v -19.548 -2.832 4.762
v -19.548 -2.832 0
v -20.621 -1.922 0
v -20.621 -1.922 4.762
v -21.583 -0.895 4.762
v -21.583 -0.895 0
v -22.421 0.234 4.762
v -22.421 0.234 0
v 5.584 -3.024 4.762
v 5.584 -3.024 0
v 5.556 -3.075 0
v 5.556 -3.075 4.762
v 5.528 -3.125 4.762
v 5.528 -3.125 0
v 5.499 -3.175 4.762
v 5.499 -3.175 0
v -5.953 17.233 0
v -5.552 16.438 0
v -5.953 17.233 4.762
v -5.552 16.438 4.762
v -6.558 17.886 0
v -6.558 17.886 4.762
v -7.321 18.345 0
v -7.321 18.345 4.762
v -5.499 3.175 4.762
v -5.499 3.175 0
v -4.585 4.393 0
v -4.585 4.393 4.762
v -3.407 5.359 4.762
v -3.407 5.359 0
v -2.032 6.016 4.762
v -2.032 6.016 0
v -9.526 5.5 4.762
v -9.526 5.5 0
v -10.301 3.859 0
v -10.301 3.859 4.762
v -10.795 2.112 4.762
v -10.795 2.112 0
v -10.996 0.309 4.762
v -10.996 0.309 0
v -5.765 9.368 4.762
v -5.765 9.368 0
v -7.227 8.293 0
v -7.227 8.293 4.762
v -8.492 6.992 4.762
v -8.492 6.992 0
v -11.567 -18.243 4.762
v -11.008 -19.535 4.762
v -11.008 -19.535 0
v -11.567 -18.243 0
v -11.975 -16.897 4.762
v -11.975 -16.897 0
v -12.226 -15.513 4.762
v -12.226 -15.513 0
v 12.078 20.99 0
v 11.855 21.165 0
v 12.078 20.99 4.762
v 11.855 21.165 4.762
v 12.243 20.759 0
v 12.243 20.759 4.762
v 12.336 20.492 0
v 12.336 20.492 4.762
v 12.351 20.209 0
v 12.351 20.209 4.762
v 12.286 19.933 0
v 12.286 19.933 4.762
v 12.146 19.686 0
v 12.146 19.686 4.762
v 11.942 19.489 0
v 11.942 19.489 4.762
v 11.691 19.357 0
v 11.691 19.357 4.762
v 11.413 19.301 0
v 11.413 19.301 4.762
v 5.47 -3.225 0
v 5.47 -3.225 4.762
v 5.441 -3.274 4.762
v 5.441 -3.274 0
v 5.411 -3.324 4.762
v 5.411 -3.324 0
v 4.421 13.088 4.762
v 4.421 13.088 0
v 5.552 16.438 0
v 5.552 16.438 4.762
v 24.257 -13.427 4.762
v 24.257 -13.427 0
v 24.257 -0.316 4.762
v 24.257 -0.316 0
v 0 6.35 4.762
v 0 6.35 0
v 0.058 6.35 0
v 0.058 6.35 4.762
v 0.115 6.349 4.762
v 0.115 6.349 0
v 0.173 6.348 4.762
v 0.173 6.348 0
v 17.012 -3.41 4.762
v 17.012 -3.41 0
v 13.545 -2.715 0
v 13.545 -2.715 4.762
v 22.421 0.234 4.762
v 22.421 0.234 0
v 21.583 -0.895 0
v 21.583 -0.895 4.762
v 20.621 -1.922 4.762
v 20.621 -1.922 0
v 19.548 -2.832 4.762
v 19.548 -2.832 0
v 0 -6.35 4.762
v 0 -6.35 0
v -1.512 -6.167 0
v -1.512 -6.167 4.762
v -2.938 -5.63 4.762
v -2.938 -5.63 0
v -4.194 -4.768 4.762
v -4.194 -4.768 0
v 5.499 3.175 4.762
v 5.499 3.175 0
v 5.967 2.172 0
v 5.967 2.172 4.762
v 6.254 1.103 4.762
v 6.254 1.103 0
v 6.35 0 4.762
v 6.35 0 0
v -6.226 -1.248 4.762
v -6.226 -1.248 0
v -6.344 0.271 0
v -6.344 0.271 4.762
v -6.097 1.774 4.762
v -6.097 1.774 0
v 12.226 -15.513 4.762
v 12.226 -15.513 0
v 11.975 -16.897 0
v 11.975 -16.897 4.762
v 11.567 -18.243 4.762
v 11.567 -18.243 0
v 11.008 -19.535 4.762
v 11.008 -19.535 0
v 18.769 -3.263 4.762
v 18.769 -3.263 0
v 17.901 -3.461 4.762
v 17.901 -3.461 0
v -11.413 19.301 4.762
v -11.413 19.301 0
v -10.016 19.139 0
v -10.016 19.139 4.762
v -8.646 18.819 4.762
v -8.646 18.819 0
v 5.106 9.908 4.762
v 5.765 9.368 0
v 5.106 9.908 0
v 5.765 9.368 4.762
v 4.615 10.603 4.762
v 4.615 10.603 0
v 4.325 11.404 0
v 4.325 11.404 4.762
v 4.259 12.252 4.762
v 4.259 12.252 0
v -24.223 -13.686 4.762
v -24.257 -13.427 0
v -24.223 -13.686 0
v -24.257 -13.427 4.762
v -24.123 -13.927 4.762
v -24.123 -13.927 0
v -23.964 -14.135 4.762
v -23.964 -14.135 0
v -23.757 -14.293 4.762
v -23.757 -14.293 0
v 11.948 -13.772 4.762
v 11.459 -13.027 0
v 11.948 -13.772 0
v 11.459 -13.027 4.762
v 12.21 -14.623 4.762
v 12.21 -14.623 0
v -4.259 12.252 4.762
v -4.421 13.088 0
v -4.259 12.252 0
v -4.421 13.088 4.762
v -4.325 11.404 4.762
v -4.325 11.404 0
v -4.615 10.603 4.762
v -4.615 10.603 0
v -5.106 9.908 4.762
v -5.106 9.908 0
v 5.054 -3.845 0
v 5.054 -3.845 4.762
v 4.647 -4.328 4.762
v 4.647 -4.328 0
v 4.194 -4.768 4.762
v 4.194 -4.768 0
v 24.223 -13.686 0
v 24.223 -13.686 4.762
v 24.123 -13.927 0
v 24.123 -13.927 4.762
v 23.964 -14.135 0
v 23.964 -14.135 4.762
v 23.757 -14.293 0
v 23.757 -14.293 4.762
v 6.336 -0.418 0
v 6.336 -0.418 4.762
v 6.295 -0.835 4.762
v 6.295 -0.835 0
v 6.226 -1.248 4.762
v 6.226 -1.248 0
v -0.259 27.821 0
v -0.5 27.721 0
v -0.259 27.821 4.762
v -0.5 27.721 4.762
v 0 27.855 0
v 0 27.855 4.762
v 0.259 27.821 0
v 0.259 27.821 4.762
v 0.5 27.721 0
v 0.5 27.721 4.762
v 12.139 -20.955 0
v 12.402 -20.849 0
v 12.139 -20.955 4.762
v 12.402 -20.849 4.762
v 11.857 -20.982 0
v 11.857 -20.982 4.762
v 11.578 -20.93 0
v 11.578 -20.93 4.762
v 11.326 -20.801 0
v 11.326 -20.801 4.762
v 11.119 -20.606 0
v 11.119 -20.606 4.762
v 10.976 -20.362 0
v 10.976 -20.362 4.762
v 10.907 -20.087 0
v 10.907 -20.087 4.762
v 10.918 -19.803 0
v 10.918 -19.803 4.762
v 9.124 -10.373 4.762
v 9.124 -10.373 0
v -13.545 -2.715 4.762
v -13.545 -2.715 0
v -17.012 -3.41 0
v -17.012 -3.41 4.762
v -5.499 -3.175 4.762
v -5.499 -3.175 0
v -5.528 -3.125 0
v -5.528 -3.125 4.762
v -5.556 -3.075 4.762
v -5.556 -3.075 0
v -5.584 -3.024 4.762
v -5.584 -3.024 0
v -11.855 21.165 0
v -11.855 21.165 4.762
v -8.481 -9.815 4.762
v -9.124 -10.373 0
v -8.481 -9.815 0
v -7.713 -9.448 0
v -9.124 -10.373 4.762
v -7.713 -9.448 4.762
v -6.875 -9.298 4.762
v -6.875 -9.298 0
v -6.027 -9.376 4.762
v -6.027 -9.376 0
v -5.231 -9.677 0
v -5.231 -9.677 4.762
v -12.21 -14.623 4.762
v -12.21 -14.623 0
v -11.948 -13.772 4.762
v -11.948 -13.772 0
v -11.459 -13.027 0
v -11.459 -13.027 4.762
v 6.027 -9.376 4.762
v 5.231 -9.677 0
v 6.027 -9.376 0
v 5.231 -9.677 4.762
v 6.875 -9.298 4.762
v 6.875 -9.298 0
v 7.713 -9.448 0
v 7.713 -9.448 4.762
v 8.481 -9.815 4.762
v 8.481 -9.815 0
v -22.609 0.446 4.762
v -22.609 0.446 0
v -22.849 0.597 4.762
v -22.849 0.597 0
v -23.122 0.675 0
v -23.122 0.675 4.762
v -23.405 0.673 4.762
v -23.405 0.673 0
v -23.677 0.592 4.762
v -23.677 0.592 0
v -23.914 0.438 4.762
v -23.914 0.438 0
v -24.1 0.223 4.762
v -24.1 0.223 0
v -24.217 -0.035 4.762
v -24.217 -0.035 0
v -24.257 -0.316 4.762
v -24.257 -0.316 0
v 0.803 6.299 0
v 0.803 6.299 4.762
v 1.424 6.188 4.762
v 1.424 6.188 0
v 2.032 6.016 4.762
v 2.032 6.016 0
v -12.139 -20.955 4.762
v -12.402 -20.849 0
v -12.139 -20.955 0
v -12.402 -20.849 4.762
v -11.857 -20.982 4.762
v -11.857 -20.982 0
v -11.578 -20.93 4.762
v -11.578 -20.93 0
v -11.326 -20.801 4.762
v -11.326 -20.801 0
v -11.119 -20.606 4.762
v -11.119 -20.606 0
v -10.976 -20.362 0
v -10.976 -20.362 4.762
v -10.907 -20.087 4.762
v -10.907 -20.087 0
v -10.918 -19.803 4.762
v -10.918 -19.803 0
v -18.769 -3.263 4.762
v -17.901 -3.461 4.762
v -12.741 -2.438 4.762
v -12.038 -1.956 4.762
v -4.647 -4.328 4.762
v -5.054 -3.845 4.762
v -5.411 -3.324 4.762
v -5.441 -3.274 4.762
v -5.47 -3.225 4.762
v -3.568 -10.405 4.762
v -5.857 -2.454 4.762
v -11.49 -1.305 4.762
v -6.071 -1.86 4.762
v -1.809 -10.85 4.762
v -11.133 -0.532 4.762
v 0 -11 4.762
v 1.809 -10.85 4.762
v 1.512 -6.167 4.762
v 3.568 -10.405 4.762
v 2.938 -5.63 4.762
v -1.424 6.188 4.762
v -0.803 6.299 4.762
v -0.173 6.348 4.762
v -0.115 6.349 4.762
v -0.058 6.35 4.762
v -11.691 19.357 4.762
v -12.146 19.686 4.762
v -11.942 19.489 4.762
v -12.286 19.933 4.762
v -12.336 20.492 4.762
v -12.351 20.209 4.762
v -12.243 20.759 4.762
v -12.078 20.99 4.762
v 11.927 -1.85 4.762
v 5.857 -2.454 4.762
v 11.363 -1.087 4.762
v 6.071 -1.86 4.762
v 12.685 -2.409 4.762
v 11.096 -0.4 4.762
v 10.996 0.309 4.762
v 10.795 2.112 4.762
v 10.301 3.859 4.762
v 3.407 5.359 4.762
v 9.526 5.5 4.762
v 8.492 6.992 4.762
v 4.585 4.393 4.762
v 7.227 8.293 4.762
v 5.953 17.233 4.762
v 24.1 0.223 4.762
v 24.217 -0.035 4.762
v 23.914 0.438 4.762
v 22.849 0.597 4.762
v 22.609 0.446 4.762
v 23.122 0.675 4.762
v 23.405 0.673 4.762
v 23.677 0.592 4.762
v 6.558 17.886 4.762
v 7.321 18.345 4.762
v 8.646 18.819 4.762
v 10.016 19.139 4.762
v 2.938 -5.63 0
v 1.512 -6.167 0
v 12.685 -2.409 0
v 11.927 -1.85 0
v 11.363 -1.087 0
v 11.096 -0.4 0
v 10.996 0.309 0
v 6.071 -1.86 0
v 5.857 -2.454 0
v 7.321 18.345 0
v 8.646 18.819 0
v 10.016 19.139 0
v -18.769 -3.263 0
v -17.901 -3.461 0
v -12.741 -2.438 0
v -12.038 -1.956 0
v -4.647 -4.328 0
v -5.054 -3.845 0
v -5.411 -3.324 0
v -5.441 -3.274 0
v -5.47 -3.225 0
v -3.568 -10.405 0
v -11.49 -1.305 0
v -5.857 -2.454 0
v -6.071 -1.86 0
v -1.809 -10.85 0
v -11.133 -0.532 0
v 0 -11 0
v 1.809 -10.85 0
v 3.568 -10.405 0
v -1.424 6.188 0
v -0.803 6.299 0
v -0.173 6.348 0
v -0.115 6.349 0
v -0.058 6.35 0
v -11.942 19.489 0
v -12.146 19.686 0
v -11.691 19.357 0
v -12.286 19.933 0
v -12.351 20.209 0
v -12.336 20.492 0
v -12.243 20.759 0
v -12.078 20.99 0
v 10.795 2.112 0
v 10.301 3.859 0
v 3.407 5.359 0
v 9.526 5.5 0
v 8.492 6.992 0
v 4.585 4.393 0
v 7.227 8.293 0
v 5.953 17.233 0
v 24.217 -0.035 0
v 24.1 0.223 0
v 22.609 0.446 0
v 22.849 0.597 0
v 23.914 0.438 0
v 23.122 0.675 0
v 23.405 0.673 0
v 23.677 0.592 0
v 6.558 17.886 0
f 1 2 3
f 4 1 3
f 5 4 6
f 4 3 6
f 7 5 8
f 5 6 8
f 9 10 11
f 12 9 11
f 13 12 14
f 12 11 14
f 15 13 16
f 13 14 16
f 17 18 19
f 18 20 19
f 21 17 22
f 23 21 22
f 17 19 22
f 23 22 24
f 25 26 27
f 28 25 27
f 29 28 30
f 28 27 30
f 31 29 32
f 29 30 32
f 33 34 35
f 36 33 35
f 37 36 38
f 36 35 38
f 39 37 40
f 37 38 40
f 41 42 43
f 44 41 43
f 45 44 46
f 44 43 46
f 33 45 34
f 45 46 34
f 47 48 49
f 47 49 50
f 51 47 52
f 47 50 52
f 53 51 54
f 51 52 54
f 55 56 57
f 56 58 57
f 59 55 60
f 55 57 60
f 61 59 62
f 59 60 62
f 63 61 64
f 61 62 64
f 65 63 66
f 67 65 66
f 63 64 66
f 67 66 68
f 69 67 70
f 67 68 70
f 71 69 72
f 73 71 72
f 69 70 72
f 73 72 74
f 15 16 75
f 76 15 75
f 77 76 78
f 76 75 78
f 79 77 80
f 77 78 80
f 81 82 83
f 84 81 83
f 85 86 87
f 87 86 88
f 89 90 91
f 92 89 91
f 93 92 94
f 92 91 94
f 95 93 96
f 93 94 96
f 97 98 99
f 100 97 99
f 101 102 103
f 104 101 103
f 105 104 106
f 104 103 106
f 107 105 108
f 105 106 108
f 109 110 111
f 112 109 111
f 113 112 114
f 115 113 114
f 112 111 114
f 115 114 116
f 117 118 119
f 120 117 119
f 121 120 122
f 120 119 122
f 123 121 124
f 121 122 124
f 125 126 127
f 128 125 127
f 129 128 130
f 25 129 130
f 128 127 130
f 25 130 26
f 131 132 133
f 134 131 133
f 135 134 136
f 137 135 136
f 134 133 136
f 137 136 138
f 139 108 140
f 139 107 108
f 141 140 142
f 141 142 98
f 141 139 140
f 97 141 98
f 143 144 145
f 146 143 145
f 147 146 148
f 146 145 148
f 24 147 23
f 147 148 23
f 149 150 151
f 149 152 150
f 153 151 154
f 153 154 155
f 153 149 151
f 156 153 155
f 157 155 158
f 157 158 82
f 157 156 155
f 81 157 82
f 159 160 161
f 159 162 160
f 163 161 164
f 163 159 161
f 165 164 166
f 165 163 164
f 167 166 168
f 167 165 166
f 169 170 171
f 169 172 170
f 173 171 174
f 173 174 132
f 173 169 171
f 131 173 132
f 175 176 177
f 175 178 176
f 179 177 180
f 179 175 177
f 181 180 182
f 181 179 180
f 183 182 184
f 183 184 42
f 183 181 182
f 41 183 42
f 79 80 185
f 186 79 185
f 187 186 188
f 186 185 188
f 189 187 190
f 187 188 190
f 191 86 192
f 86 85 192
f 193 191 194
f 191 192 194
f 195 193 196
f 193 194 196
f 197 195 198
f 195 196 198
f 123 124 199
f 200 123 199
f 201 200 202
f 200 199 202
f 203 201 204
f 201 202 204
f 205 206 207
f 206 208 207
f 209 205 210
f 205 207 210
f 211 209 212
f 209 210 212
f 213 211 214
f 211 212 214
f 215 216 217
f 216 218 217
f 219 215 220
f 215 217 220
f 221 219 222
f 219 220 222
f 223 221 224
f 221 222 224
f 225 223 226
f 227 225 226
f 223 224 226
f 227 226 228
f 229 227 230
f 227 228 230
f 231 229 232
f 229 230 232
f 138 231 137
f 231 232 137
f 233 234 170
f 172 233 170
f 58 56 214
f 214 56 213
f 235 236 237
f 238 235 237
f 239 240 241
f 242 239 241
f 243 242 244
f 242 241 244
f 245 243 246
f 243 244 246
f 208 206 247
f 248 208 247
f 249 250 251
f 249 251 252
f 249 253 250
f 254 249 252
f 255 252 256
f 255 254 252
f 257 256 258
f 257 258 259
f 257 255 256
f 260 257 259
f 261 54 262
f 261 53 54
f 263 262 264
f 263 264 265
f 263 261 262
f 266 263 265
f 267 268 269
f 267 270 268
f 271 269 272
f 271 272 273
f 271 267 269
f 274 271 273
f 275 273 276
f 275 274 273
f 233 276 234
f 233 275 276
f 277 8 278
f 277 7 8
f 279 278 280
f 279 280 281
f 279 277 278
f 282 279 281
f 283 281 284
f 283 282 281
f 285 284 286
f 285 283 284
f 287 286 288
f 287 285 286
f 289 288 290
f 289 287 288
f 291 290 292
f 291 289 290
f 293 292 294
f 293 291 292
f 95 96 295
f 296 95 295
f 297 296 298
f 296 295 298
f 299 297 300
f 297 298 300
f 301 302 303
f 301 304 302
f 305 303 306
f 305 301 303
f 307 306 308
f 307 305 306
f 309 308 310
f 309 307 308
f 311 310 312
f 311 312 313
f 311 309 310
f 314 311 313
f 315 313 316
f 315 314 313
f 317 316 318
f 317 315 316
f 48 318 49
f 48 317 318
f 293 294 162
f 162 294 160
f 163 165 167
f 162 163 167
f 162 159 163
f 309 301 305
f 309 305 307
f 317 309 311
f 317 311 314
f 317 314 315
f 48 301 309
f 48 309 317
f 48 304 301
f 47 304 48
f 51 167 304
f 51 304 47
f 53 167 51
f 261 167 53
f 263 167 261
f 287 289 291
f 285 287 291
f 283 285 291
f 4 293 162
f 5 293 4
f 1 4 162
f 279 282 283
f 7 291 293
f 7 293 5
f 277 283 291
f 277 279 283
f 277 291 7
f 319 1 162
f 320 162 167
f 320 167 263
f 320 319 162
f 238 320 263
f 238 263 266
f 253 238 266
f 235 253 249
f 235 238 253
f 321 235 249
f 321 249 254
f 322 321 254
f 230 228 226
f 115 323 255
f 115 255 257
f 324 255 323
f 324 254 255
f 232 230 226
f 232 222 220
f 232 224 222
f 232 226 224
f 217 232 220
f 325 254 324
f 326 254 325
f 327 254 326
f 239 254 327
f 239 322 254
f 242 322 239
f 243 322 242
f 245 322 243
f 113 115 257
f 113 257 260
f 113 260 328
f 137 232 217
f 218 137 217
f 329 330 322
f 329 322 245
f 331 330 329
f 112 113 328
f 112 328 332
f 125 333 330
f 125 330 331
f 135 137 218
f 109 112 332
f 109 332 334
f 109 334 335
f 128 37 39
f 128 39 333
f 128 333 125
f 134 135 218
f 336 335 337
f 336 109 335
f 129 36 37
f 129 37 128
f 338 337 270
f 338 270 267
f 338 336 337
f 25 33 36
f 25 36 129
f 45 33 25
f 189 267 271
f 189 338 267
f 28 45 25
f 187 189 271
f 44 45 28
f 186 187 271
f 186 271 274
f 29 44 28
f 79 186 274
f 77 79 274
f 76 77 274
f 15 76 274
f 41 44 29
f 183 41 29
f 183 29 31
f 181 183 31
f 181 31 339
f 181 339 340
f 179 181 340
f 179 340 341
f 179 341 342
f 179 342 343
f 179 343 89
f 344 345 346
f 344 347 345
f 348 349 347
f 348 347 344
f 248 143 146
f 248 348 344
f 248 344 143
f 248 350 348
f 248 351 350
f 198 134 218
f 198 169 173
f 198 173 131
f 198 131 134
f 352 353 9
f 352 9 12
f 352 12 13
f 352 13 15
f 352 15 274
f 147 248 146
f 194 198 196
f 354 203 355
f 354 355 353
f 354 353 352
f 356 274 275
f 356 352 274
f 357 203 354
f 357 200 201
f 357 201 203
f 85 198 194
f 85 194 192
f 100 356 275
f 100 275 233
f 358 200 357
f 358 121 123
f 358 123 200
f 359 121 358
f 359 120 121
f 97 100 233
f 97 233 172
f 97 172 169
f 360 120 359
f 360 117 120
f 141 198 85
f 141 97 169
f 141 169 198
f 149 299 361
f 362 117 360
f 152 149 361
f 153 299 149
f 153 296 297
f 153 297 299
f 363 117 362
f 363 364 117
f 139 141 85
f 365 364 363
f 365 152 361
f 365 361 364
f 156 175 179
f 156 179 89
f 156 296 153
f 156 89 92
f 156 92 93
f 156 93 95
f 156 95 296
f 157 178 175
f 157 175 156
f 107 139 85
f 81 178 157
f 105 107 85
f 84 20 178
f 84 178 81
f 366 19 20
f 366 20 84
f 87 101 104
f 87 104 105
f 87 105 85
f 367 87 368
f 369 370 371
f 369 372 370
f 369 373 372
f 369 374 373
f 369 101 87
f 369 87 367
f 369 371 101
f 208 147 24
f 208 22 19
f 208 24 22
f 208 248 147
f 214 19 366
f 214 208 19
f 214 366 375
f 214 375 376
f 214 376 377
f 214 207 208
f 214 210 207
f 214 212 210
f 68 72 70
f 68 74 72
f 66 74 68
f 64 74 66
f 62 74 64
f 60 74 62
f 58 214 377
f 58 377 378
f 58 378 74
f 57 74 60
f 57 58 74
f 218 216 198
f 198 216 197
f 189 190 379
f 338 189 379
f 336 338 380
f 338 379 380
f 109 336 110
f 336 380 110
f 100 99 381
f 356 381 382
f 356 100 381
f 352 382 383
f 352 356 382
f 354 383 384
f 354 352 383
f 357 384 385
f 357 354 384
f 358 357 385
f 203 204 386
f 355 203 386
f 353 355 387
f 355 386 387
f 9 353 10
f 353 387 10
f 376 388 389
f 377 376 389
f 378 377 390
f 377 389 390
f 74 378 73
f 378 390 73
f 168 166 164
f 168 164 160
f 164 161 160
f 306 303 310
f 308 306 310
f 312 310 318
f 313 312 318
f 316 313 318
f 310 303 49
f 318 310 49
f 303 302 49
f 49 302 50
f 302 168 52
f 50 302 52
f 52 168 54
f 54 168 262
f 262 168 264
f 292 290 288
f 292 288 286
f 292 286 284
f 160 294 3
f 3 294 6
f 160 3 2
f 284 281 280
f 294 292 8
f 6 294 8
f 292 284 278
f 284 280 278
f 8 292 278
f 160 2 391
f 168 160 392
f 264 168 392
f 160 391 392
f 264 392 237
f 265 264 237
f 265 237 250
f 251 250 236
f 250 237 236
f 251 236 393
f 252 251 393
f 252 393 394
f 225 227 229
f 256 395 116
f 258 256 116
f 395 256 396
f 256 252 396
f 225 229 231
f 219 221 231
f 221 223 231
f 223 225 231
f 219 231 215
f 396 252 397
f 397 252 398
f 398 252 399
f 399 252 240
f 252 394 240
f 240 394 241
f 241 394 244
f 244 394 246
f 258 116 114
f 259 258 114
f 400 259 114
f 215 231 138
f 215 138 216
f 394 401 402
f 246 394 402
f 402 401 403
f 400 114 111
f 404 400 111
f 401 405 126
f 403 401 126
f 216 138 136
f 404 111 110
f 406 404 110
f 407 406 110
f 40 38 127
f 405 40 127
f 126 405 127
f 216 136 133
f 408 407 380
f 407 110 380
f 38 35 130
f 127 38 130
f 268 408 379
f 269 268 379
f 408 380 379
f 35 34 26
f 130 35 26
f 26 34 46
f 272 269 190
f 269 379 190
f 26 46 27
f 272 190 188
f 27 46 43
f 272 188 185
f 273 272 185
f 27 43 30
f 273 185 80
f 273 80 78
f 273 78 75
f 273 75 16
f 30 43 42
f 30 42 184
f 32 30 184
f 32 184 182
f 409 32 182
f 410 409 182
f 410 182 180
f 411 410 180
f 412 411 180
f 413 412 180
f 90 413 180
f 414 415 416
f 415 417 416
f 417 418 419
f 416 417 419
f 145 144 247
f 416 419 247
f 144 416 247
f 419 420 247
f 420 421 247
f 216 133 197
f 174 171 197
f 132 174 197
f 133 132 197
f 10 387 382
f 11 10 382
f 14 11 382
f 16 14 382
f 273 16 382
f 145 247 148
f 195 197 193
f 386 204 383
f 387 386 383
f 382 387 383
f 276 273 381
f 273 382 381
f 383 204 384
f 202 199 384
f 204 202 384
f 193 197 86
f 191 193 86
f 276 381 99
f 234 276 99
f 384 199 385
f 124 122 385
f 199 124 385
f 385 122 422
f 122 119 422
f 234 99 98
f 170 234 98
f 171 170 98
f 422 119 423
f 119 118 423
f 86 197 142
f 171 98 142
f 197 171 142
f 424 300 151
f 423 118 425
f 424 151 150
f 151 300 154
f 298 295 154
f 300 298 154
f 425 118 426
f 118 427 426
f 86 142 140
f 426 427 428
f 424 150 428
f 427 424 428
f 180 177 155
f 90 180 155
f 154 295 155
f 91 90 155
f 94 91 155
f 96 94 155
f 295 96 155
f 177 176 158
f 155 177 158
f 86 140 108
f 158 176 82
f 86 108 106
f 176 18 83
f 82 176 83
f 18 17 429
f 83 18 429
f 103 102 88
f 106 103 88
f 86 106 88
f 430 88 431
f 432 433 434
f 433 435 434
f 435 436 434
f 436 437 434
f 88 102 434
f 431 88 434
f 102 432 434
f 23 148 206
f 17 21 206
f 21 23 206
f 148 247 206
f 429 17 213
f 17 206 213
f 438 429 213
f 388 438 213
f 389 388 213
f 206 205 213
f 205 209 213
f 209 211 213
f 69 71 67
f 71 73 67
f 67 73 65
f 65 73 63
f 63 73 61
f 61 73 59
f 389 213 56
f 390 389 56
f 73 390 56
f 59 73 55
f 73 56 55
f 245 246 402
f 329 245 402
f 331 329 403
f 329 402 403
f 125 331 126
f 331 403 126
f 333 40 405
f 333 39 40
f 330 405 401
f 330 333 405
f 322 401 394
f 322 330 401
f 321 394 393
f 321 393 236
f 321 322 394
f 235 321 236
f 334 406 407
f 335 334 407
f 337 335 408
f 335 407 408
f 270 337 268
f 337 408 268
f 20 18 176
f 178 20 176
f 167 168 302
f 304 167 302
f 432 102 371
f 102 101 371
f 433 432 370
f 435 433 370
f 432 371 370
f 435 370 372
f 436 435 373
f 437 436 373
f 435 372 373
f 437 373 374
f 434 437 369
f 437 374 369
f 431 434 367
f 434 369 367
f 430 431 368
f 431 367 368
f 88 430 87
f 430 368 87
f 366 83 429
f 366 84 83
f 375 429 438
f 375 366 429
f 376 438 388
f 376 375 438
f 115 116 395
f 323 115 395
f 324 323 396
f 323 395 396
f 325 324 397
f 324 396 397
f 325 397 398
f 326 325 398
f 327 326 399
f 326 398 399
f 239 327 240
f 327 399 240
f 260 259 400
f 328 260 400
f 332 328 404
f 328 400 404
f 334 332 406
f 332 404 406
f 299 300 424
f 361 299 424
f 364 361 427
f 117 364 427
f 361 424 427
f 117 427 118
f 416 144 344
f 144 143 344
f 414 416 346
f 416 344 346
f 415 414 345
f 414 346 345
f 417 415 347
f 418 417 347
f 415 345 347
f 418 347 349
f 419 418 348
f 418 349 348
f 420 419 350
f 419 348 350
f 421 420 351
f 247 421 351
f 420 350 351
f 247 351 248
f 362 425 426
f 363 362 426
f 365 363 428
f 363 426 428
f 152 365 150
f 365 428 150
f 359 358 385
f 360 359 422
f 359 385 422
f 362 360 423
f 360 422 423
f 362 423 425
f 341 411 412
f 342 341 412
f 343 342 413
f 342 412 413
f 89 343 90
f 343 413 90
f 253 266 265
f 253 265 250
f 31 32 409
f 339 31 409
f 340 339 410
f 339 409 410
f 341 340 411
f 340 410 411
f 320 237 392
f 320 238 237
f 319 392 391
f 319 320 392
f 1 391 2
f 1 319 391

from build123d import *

# Parameters (mm, degrees)
F1_DEPTH = 4.7625
F2_R     = 3.175
F3_R     = 1


with BuildPart() as f1:
    # F0 (on Top) → F1 (new body)
    with BuildSketch(Plane.XY):
        with BuildLine():
            ThreePointArc((-0.4726846942, 10.989839361), (-0.236396943, 10.9974595469), (0, 11))
            Line((0, 11), (0, 28.0095709595))
            Line((0, 28.0095709595), (-5.969, 17.6709596891))
            ThreePointArc((-5.969, 17.6709596891), (-2.6150512525, 14.8287618807), (-0.4726846942, 10.989839361))
        make_face()
        with BuildLine():
            ThreePointArc((0, 11), (0.236396943, 10.9974595469), (0.4726846942, 10.989839361))
            ThreePointArc((0.4726846942, 10.989839361), (2.6150512525, 14.8287618807), (5.969, 17.6709596891))
            Line((5.969, 17.6709596891), (0, 28.0095709595))
            Line((0, 28.0095709595), (0, 11))
        make_face()
        with BuildLine():
            Line((-18.288, -3.6661742094), (-24.257, -14.0047854797))
            Line((-24.257, -14.0047854797), (-9.5262794416, -5.5))
            ThreePointArc((-9.5262794416, -5.5), (-9.6422778162, -5.2940040154), (-9.7538224172, -5.0855627274))
            ThreePointArc((-9.7538224172, -5.0855627274), (-14.1496101216, -5.1496801235), (-18.288, -3.6661742094))
        make_face()
        with BuildLine():
            Line((-9.5262794416, -5.5), (-24.257, -14.0047854797))
            Line((-24.257, -14.0047854797), (-12.319, -14.0047854797))
            ThreePointArc((-12.319, -14.0047854797), (-11.5345588691, -9.6790817572), (-9.281137723, -5.9042766336))
            ThreePointArc((-9.281137723, -5.9042766336), (-9.4058808732, -5.7034555315), (-9.5262794416, -5.5))
        make_face()
        with BuildLine():
            Line((24.257, -14.0047854797), (9.5262794416, -5.5))
            ThreePointArc((9.5262794416, -5.5), (9.4058808732, -5.7034555315), (9.281137723, -5.9042766336))
            ThreePointArc((9.281137723, -5.9042766336), (11.5345588691, -9.6790817572), (12.319, -14.0047854797))
            Line((12.319, -14.0047854797), (24.257, -14.0047854797))
        make_face()
        with BuildLine():
            ThreePointArc((18.288, -3.6661742094), (14.1496101216, -5.1496801235), (9.7538224172, -5.0855627274))
            ThreePointArc((9.7538224172, -5.0855627274), (9.6422778162, -5.2940040154), (9.5262794416, -5.5))
            Line((9.5262794416, -5.5), (24.257, -14.0047854797))
            Line((24.257, -14.0047854797), (18.288, -3.6661742094))
        make_face()
        with BuildLine():
            ThreePointArc((-6.2261252968, -1.2481441375), (-6.2659575333, 1.0296971356), (-5.499261314, 3.175))
            Line((-5.499261314, 3.175), (-9.5262794416, 5.5))
            ThreePointArc((-9.5262794416, 5.5), (-10.8544146246, 1.7837273215), (-10.7854139, -2.1621394509))
            Line((-10.7854139, -2.1621394509), (-6.2261252968, -1.2481441375))
        make_face()
        with BuildLine():
            ThreePointArc((-2.0321381177, 6.016054743), (-1.115007867, 6.2513404528), (-0.1730877259, 6.3476405569))
            ThreePointArc((-0.1730877259, 6.3476405569), (-0.1672424774, 7.7590154524), (0, 9.1604587143))
            ThreePointArc((0, 9.1604587143), (-0.2012173242, 10.0842248201), (-0.4726846942, 10.989839361))
            ThreePointArc((-0.4726846942, 10.989839361), (-2.0165835906, 10.8135743685), (-3.520239259, 10.4215121532))
            Line((-3.520239259, 10.4215121532), (-2.0321381177, 6.016054743))
        make_face()
        with BuildLine():
            ThreePointArc((0.1730877259, 6.3476405569), (1.115007867, 6.2513404528), (2.0321381177, 6.016054743))
            Line((2.0321381177, 6.016054743), (3.520239259, 10.4215121532))
            ThreePointArc((3.520239259, 10.4215121532), (2.0165835906, 10.8135743685), (0.4726846942, 10.989839361))
            ThreePointArc((0.4726846942, 10.989839361), (0.2012173242, 10.0842248201), (0, 9.1604587143))
            ThreePointArc((0, 9.1604587143), (0.1427825837, 8.0856215938), (0.1905, 7.0023927399))
            ThreePointArc((0.1905, 7.0023927399), (0.1861461621, 6.6749009047), (0.1730877259, 6.3476405569))
        make_face()
        with BuildLine():
            ThreePointArc((5.499261314, 3.175), (6.1336289969, 1.6435009364), (6.35, 0))
            ThreePointArc((6.35, 0), (6.3189554372, -0.6271380889), (6.2261252968, -1.2481441375))
            Line((6.2261252968, -1.2481441375), (10.7854139, -2.1621394509))
            ThreePointArc((10.7854139, -2.1621394509), (10.9462220172, -1.0863809414), (11, 0))
            ThreePointArc((11, 0), (10.6251840892, 2.8470094961), (9.5262794416, 5.5))
            Line((9.5262794416, 5.5), (5.499261314, 3.175))
        make_face()
        with BuildLine():
            ThreePointArc((4.1939871791, -4.7679106054), (2.241234889, -5.9413269707), (0, -6.35))
            Line((0, -6.35), (0, -11))
            ThreePointArc((0, -11), (3.8824541385, -10.2920624689), (7.265174641, -8.2593727023))
            Line((7.265174641, -8.2593727023), (4.1939871791, -4.7679106054))
        make_face()
        with BuildLine():
            ThreePointArc((-4.1939871791, -4.7679106054), (-4.8563157063, -4.0912953646), (-5.4106741134, -3.3237186462))
            ThreePointArc((-5.4106741134, -3.3237186462), (-6.6358832514, -4.0243439602), (-7.9331899569, -4.5802293571))
            ThreePointArc((-7.9331899569, -4.5802293571), (-8.6325862096, -5.2163717244), (-9.281137723, -5.9042766336))
            ThreePointArc((-9.281137723, -5.9042766336), (-8.3565383135, -7.1531998025), (-7.265174641, -8.2593727023))
            Line((-7.265174641, -8.2593727023), (-4.1939871791, -4.7679106054))
        make_face()
        with BuildLine():
            Line((-9.5262794416, -5.5), (-7.9331899569, -4.5802293571))
            ThreePointArc((-7.9331899569, -4.5802293571), (-8.8338035337, -4.8678530956), (-9.7538224172, -5.0855627274))
            ThreePointArc((-9.7538224172, -5.0855627274), (-9.6422778162, -5.2940040154), (-9.5262794416, -5.5))
        make_face()
        with BuildLine():
            ThreePointArc((-9.281137723, -5.9042766336), (-8.6325862096, -5.2163717244), (-7.9331899569, -4.5802293571))
            Line((-7.9331899569, -4.5802293571), (-9.5262794416, -5.5))
            ThreePointArc((-9.5262794416, -5.5), (-9.4058808732, -5.7034555315), (-9.281137723, -5.9042766336))
        make_face()
        with BuildLine():
            Line((-7.9331899569, -4.5802293571), (-5.499261314, -3.175))
            ThreePointArc((-5.499261314, -3.175), (-5.5420264075, -3.0997489089), (-5.5837618393, -3.0239219107))
            ThreePointArc((-5.5837618393, -3.0239219107), (-6.8031257288, -3.7346714922), (-7.9331899569, -4.5802293571))
        make_face()
        with BuildLine():
            ThreePointArc((-5.4106741134, -3.3237186462), (-5.4554745042, -3.2496612029), (-5.499261314, -3.175))
            Line((-5.499261314, -3.175), (-7.9331899569, -4.5802293571))
            ThreePointArc((-7.9331899569, -4.5802293571), (-6.6358832514, -4.0243439602), (-5.4106741134, -3.3237186462))
        make_face()
        with BuildLine():
            ThreePointArc((-0.4726846942, 10.989839361), (-0.2012173242, 10.0842248201), (0, 9.1604587143))
            Line((0, 9.1604587143), (0, 11))
            ThreePointArc((0, 11), (-0.236396943, 10.9974595469), (-0.4726846942, 10.989839361))
        make_face()
        with BuildLine():
            ThreePointArc((0, 9.1604587143), (0.2012173242, 10.0842248201), (0.4726846942, 10.989839361))
            ThreePointArc((0.4726846942, 10.989839361), (0.236396943, 10.9974595469), (0, 11))
            Line((0, 11), (0, 9.1604587143))
        make_face()
        with BuildLine():
            ThreePointArc((-0.1730877259, 6.3476405569), (-0.0865519033, 6.3494101118), (0, 6.35))
            Line((0, 6.35), (0, 9.1604587143))
            ThreePointArc((0, 9.1604587143), (-0.1672424774, 7.7590154524), (-0.1730877259, 6.3476405569))
        make_face()
        with BuildLine():
            ThreePointArc((0, 6.35), (0.0865519033, 6.3494101118), (0.1730877259, 6.3476405569))
            ThreePointArc((0.1730877259, 6.3476405569), (0.1861461621, 6.6749009047), (0.1905, 7.0023927399))
            ThreePointArc((0.1905, 7.0023927399), (0.1427825837, 8.0856215938), (0, 9.1604587143))
            Line((0, 9.1604587143), (0, 6.35))
        make_face()
        with BuildLine():
            ThreePointArc((7.9331899569, -4.5802293571), (6.8031257288, -3.7346714922), (5.5837618393, -3.0239219107))
            ThreePointArc((5.5837618393, -3.0239219107), (5.5420264075, -3.0997489089), (5.499261314, -3.175))
            Line((5.499261314, -3.175), (7.9331899569, -4.5802293571))
        make_face()
        with BuildLine():
            Line((7.9331899569, -4.5802293571), (5.499261314, -3.175))
            ThreePointArc((5.499261314, -3.175), (5.4554745042, -3.2496612029), (5.4106741134, -3.3237186462))
            ThreePointArc((5.4106741134, -3.3237186462), (6.6358832514, -4.0243439602), (7.9331899569, -4.5802293571))
        make_face()
        with BuildLine():
            ThreePointArc((9.7538224172, -5.0855627274), (8.8338035337, -4.8678530956), (7.9331899569, -4.5802293571))
            Line((7.9331899569, -4.5802293571), (9.5262794416, -5.5))
            ThreePointArc((9.5262794416, -5.5), (9.6422778162, -5.2940040154), (9.7538224172, -5.0855627274))
        make_face()
        with BuildLine():
            Line((9.5262794416, -5.5), (7.9331899569, -4.5802293571))
            ThreePointArc((7.9331899569, -4.5802293571), (8.6325862096, -5.2163717244), (9.281137723, -5.9042766336))
            ThreePointArc((9.281137723, -5.9042766336), (9.4058808732, -5.7034555315), (9.5262794416, -5.5))
        make_face()
        with BuildLine():
            ThreePointArc((-9.7538224172, -5.0855627274), (-10.3731219041, -3.6603745659), (-10.7854139, -2.1621394509))
            Line((-10.7854139, -2.1621394509), (-18.288, -3.6661742094))
            ThreePointArc((-18.288, -3.6661742094), (-14.1496101216, -5.1496801235), (-9.7538224172, -5.0855627274))
        make_face()
        with BuildLine():
            ThreePointArc((-7.9331899569, -4.5802293571), (-6.8031257288, -3.7346714922), (-5.5837618393, -3.0239219107))
            ThreePointArc((-5.5837618393, -3.0239219107), (-5.9713235733, -2.1600450882), (-6.2261252968, -1.2481441375))
            Line((-6.2261252968, -1.2481441375), (-10.7854139, -2.1621394509))
            ThreePointArc((-10.7854139, -2.1621394509), (-10.3731219041, -3.6603745659), (-9.7538224172, -5.0855627274))
            ThreePointArc((-9.7538224172, -5.0855627274), (-8.8338035337, -4.8678530956), (-7.9331899569, -4.5802293571))
        make_face()
        with BuildLine():
            Line((-12.319, -14.0047854797), (-7.265174641, -8.2593727023))
            ThreePointArc((-7.265174641, -8.2593727023), (-8.3565383135, -7.1531998025), (-9.281137723, -5.9042766336))
            ThreePointArc((-9.281137723, -5.9042766336), (-11.5345588691, -9.6790817572), (-12.319, -14.0047854797))
        make_face()
        with BuildLine():
            ThreePointArc((12.319, -14.0047854797), (11.5345588691, -9.6790817572), (9.281137723, -5.9042766336))
            ThreePointArc((9.281137723, -5.9042766336), (8.3565383135, -7.1531998025), (7.265174641, -8.2593727023))
            Line((7.265174641, -8.2593727023), (12.319, -14.0047854797))
        make_face()
        with BuildLine():
            ThreePointArc((9.281137723, -5.9042766336), (8.6325862096, -5.2163717244), (7.9331899569, -4.5802293571))
            ThreePointArc((7.9331899569, -4.5802293571), (6.6358832514, -4.0243439602), (5.4106741134, -3.3237186462))
            ThreePointArc((5.4106741134, -3.3237186462), (4.8563157063, -4.0912953646), (4.1939871791, -4.7679106054))
            Line((4.1939871791, -4.7679106054), (7.265174641, -8.2593727023))
            ThreePointArc((7.265174641, -8.2593727023), (8.3565383135, -7.1531998025), (9.281137723, -5.9042766336))
        make_face()
        with BuildLine():
            Line((10.7854139, -2.1621394509), (6.2261252968, -1.2481441375))
            ThreePointArc((6.2261252968, -1.2481441375), (5.9713235733, -2.1600450882), (5.5837618393, -3.0239219107))
            ThreePointArc((5.5837618393, -3.0239219107), (6.8031257288, -3.7346714922), (7.9331899569, -4.5802293571))
            ThreePointArc((7.9331899569, -4.5802293571), (8.8338035337, -4.8678530956), (9.7538224172, -5.0855627274))
            ThreePointArc((9.7538224172, -5.0855627274), (10.3731219041, -3.6603745659), (10.7854139, -2.1621394509))
        make_face()
        with BuildLine():
            Line((18.288, -3.6661742094), (10.7854139, -2.1621394509))
            ThreePointArc((10.7854139, -2.1621394509), (10.3731219041, -3.6603745659), (9.7538224172, -5.0855627274))
            ThreePointArc((9.7538224172, -5.0855627274), (14.1496101216, -5.1496801235), (18.288, -3.6661742094))
        make_face()
        with BuildLine():
            ThreePointArc((2.0321381177, 6.016054743), (4.0247226443, 4.9116298351), (5.499261314, 3.175))
            Line((5.499261314, 3.175), (9.5262794416, 5.5))
            ThreePointArc((9.5262794416, 5.5), (6.9719604861, 8.5083351474), (3.520239259, 10.4215121532))
            Line((3.520239259, 10.4215121532), (2.0321381177, 6.016054743))
        make_face()
        with BuildLine():
            Line((-9.5262794416, 5.5), (-5.499261314, 3.175))
            ThreePointArc((-5.499261314, 3.175), (-4.0247226443, 4.9116298351), (-2.0321381177, 6.016054743))
            Line((-2.0321381177, 6.016054743), (-3.520239259, 10.4215121532))
            ThreePointArc((-3.520239259, 10.4215121532), (-6.9719604861, 8.5083351474), (-9.5262794416, 5.5))
        make_face()
        with BuildLine():
            Line((0, -11), (0, -6.35))
            ThreePointArc((0, -6.35), (-2.241234889, -5.9413269707), (-4.1939871791, -4.7679106054))
            Line((-4.1939871791, -4.7679106054), (-7.265174641, -8.2593727023))
            ThreePointArc((-7.265174641, -8.2593727023), (-3.8824541385, -10.2920624689), (0, -11))
        make_face()
        with BuildLine():
            ThreePointArc((-3.520239259, 10.4215121532), (-2.0165835906, 10.8135743685), (-0.4726846942, 10.989839361))
            ThreePointArc((-0.4726846942, 10.989839361), (-2.6150512525, 14.8287618807), (-5.969, 17.6709596891))
            Line((-5.969, 17.6709596891), (-3.520239259, 10.4215121532))
        make_face()
        with BuildLine():
            ThreePointArc((0.4726846942, 10.989839361), (2.0165835906, 10.8135743685), (3.520239259, 10.4215121532))
            Line((3.520239259, 10.4215121532), (5.969, 17.6709596891))
            ThreePointArc((5.969, 17.6709596891), (2.6150512525, 14.8287618807), (0.4726846942, 10.989839361))
        make_face()
        with BuildLine():
            Line((-24.257, 4.8443267654), (-24.257, -14.0047854797))
            Line((-24.257, -14.0047854797), (-18.288, -3.6661742094))
            ThreePointArc((-18.288, -3.6661742094), (-22.2141280276, -0.0713522576), (-24.257, 4.8443267654))
        make_face()
        with BuildLine():
            Line((-12.319, -14.0047854797), (-24.257, -14.0047854797))
            Line((-24.257, -14.0047854797), (-7.9331899569, -23.4293416023))
            ThreePointArc((-7.9331899569, -23.4293416023), (-11.1688568815, -19.202323066), (-12.319, -14.0047854797))
        make_face()
        with BuildLine():
            Line((7.9331899569, -23.4293416023), (24.257, -14.0047854797))
            Line((24.257, -14.0047854797), (12.319, -14.0047854797))
            ThreePointArc((12.319, -14.0047854797), (11.1688568815, -19.202323066), (7.9331899569, -23.4293416023))
        make_face()
        with BuildLine():
            ThreePointArc((24.257, 4.8443267654), (22.2141280276, -0.0713522576), (18.288, -3.6661742094))
            Line((18.288, -3.6661742094), (24.257, -14.0047854797))
            Line((24.257, -14.0047854797), (24.257, 4.8443267654))
        make_face()
        with BuildLine():
            Line((0, 28.0095709595), (5.969, 17.6709596891))
            ThreePointArc((5.969, 17.6709596891), (11.0452711461, 19.2736753236), (16.3238100431, 18.5850148369))
            Line((16.3238100431, 18.5850148369), (0, 28.0095709595))
        make_face()
        with BuildLine():
            Line((-5.969, 17.6709596891), (0, 28.0095709595))
            Line((0, 28.0095709595), (-16.3238100431, 18.5850148369))
            ThreePointArc((-16.3238100431, 18.5850148369), (-11.0452711461, 19.2736753236), (-5.969, 17.6709596891))
        make_face()
    extrude(amount=F1_DEPTH)

    # F2
    f2_edges = [f1.edges().sort_by_distance(p)[0] for p in [
        (-5.969, 17.67096, 2.38125),
        (5.969, 17.67096, 2.38125),
        (-7.265175, -8.259373, 2.38125),
        (7.265175, -8.259373, 2.38125),
        (-18.288, -3.666174, 2.38125),
        (18.288, -3.666174, 2.38125),
        (3.520239, 10.421512, 2.38125),
        (10.785414, -2.162139, 2.38125),
        (-12.319, -14.004785, 2.38125),
        (12.319, -14.004785, 2.38125),
        (-10.785414, -2.162139, 2.38125),
        (-3.520239, 10.421512, 2.38125),
    ]]
    fillet(f2_edges, radius=F2_R)

    # F3
    f3_edges = [f1.edges().sort_by_distance(p)[0] for p in [
        (-24.257, 4.844327, 2.38125),
        (24.257, 4.844327, 2.38125),
        (16.32381, 18.585015, 2.38125),
        (-16.32381, 18.585015, 2.38125),
        (7.93319, -23.429342, 2.38125),
        (-7.93319, -23.429342, 2.38125),
        (0, 28.009571, 2.38125),
        (24.257, -14.004785, 2.38125),
        (-24.257, -14.004785, 2.38125),
    ]]
    fillet(f3_edges, radius=F3_R)


solid = f1.part
